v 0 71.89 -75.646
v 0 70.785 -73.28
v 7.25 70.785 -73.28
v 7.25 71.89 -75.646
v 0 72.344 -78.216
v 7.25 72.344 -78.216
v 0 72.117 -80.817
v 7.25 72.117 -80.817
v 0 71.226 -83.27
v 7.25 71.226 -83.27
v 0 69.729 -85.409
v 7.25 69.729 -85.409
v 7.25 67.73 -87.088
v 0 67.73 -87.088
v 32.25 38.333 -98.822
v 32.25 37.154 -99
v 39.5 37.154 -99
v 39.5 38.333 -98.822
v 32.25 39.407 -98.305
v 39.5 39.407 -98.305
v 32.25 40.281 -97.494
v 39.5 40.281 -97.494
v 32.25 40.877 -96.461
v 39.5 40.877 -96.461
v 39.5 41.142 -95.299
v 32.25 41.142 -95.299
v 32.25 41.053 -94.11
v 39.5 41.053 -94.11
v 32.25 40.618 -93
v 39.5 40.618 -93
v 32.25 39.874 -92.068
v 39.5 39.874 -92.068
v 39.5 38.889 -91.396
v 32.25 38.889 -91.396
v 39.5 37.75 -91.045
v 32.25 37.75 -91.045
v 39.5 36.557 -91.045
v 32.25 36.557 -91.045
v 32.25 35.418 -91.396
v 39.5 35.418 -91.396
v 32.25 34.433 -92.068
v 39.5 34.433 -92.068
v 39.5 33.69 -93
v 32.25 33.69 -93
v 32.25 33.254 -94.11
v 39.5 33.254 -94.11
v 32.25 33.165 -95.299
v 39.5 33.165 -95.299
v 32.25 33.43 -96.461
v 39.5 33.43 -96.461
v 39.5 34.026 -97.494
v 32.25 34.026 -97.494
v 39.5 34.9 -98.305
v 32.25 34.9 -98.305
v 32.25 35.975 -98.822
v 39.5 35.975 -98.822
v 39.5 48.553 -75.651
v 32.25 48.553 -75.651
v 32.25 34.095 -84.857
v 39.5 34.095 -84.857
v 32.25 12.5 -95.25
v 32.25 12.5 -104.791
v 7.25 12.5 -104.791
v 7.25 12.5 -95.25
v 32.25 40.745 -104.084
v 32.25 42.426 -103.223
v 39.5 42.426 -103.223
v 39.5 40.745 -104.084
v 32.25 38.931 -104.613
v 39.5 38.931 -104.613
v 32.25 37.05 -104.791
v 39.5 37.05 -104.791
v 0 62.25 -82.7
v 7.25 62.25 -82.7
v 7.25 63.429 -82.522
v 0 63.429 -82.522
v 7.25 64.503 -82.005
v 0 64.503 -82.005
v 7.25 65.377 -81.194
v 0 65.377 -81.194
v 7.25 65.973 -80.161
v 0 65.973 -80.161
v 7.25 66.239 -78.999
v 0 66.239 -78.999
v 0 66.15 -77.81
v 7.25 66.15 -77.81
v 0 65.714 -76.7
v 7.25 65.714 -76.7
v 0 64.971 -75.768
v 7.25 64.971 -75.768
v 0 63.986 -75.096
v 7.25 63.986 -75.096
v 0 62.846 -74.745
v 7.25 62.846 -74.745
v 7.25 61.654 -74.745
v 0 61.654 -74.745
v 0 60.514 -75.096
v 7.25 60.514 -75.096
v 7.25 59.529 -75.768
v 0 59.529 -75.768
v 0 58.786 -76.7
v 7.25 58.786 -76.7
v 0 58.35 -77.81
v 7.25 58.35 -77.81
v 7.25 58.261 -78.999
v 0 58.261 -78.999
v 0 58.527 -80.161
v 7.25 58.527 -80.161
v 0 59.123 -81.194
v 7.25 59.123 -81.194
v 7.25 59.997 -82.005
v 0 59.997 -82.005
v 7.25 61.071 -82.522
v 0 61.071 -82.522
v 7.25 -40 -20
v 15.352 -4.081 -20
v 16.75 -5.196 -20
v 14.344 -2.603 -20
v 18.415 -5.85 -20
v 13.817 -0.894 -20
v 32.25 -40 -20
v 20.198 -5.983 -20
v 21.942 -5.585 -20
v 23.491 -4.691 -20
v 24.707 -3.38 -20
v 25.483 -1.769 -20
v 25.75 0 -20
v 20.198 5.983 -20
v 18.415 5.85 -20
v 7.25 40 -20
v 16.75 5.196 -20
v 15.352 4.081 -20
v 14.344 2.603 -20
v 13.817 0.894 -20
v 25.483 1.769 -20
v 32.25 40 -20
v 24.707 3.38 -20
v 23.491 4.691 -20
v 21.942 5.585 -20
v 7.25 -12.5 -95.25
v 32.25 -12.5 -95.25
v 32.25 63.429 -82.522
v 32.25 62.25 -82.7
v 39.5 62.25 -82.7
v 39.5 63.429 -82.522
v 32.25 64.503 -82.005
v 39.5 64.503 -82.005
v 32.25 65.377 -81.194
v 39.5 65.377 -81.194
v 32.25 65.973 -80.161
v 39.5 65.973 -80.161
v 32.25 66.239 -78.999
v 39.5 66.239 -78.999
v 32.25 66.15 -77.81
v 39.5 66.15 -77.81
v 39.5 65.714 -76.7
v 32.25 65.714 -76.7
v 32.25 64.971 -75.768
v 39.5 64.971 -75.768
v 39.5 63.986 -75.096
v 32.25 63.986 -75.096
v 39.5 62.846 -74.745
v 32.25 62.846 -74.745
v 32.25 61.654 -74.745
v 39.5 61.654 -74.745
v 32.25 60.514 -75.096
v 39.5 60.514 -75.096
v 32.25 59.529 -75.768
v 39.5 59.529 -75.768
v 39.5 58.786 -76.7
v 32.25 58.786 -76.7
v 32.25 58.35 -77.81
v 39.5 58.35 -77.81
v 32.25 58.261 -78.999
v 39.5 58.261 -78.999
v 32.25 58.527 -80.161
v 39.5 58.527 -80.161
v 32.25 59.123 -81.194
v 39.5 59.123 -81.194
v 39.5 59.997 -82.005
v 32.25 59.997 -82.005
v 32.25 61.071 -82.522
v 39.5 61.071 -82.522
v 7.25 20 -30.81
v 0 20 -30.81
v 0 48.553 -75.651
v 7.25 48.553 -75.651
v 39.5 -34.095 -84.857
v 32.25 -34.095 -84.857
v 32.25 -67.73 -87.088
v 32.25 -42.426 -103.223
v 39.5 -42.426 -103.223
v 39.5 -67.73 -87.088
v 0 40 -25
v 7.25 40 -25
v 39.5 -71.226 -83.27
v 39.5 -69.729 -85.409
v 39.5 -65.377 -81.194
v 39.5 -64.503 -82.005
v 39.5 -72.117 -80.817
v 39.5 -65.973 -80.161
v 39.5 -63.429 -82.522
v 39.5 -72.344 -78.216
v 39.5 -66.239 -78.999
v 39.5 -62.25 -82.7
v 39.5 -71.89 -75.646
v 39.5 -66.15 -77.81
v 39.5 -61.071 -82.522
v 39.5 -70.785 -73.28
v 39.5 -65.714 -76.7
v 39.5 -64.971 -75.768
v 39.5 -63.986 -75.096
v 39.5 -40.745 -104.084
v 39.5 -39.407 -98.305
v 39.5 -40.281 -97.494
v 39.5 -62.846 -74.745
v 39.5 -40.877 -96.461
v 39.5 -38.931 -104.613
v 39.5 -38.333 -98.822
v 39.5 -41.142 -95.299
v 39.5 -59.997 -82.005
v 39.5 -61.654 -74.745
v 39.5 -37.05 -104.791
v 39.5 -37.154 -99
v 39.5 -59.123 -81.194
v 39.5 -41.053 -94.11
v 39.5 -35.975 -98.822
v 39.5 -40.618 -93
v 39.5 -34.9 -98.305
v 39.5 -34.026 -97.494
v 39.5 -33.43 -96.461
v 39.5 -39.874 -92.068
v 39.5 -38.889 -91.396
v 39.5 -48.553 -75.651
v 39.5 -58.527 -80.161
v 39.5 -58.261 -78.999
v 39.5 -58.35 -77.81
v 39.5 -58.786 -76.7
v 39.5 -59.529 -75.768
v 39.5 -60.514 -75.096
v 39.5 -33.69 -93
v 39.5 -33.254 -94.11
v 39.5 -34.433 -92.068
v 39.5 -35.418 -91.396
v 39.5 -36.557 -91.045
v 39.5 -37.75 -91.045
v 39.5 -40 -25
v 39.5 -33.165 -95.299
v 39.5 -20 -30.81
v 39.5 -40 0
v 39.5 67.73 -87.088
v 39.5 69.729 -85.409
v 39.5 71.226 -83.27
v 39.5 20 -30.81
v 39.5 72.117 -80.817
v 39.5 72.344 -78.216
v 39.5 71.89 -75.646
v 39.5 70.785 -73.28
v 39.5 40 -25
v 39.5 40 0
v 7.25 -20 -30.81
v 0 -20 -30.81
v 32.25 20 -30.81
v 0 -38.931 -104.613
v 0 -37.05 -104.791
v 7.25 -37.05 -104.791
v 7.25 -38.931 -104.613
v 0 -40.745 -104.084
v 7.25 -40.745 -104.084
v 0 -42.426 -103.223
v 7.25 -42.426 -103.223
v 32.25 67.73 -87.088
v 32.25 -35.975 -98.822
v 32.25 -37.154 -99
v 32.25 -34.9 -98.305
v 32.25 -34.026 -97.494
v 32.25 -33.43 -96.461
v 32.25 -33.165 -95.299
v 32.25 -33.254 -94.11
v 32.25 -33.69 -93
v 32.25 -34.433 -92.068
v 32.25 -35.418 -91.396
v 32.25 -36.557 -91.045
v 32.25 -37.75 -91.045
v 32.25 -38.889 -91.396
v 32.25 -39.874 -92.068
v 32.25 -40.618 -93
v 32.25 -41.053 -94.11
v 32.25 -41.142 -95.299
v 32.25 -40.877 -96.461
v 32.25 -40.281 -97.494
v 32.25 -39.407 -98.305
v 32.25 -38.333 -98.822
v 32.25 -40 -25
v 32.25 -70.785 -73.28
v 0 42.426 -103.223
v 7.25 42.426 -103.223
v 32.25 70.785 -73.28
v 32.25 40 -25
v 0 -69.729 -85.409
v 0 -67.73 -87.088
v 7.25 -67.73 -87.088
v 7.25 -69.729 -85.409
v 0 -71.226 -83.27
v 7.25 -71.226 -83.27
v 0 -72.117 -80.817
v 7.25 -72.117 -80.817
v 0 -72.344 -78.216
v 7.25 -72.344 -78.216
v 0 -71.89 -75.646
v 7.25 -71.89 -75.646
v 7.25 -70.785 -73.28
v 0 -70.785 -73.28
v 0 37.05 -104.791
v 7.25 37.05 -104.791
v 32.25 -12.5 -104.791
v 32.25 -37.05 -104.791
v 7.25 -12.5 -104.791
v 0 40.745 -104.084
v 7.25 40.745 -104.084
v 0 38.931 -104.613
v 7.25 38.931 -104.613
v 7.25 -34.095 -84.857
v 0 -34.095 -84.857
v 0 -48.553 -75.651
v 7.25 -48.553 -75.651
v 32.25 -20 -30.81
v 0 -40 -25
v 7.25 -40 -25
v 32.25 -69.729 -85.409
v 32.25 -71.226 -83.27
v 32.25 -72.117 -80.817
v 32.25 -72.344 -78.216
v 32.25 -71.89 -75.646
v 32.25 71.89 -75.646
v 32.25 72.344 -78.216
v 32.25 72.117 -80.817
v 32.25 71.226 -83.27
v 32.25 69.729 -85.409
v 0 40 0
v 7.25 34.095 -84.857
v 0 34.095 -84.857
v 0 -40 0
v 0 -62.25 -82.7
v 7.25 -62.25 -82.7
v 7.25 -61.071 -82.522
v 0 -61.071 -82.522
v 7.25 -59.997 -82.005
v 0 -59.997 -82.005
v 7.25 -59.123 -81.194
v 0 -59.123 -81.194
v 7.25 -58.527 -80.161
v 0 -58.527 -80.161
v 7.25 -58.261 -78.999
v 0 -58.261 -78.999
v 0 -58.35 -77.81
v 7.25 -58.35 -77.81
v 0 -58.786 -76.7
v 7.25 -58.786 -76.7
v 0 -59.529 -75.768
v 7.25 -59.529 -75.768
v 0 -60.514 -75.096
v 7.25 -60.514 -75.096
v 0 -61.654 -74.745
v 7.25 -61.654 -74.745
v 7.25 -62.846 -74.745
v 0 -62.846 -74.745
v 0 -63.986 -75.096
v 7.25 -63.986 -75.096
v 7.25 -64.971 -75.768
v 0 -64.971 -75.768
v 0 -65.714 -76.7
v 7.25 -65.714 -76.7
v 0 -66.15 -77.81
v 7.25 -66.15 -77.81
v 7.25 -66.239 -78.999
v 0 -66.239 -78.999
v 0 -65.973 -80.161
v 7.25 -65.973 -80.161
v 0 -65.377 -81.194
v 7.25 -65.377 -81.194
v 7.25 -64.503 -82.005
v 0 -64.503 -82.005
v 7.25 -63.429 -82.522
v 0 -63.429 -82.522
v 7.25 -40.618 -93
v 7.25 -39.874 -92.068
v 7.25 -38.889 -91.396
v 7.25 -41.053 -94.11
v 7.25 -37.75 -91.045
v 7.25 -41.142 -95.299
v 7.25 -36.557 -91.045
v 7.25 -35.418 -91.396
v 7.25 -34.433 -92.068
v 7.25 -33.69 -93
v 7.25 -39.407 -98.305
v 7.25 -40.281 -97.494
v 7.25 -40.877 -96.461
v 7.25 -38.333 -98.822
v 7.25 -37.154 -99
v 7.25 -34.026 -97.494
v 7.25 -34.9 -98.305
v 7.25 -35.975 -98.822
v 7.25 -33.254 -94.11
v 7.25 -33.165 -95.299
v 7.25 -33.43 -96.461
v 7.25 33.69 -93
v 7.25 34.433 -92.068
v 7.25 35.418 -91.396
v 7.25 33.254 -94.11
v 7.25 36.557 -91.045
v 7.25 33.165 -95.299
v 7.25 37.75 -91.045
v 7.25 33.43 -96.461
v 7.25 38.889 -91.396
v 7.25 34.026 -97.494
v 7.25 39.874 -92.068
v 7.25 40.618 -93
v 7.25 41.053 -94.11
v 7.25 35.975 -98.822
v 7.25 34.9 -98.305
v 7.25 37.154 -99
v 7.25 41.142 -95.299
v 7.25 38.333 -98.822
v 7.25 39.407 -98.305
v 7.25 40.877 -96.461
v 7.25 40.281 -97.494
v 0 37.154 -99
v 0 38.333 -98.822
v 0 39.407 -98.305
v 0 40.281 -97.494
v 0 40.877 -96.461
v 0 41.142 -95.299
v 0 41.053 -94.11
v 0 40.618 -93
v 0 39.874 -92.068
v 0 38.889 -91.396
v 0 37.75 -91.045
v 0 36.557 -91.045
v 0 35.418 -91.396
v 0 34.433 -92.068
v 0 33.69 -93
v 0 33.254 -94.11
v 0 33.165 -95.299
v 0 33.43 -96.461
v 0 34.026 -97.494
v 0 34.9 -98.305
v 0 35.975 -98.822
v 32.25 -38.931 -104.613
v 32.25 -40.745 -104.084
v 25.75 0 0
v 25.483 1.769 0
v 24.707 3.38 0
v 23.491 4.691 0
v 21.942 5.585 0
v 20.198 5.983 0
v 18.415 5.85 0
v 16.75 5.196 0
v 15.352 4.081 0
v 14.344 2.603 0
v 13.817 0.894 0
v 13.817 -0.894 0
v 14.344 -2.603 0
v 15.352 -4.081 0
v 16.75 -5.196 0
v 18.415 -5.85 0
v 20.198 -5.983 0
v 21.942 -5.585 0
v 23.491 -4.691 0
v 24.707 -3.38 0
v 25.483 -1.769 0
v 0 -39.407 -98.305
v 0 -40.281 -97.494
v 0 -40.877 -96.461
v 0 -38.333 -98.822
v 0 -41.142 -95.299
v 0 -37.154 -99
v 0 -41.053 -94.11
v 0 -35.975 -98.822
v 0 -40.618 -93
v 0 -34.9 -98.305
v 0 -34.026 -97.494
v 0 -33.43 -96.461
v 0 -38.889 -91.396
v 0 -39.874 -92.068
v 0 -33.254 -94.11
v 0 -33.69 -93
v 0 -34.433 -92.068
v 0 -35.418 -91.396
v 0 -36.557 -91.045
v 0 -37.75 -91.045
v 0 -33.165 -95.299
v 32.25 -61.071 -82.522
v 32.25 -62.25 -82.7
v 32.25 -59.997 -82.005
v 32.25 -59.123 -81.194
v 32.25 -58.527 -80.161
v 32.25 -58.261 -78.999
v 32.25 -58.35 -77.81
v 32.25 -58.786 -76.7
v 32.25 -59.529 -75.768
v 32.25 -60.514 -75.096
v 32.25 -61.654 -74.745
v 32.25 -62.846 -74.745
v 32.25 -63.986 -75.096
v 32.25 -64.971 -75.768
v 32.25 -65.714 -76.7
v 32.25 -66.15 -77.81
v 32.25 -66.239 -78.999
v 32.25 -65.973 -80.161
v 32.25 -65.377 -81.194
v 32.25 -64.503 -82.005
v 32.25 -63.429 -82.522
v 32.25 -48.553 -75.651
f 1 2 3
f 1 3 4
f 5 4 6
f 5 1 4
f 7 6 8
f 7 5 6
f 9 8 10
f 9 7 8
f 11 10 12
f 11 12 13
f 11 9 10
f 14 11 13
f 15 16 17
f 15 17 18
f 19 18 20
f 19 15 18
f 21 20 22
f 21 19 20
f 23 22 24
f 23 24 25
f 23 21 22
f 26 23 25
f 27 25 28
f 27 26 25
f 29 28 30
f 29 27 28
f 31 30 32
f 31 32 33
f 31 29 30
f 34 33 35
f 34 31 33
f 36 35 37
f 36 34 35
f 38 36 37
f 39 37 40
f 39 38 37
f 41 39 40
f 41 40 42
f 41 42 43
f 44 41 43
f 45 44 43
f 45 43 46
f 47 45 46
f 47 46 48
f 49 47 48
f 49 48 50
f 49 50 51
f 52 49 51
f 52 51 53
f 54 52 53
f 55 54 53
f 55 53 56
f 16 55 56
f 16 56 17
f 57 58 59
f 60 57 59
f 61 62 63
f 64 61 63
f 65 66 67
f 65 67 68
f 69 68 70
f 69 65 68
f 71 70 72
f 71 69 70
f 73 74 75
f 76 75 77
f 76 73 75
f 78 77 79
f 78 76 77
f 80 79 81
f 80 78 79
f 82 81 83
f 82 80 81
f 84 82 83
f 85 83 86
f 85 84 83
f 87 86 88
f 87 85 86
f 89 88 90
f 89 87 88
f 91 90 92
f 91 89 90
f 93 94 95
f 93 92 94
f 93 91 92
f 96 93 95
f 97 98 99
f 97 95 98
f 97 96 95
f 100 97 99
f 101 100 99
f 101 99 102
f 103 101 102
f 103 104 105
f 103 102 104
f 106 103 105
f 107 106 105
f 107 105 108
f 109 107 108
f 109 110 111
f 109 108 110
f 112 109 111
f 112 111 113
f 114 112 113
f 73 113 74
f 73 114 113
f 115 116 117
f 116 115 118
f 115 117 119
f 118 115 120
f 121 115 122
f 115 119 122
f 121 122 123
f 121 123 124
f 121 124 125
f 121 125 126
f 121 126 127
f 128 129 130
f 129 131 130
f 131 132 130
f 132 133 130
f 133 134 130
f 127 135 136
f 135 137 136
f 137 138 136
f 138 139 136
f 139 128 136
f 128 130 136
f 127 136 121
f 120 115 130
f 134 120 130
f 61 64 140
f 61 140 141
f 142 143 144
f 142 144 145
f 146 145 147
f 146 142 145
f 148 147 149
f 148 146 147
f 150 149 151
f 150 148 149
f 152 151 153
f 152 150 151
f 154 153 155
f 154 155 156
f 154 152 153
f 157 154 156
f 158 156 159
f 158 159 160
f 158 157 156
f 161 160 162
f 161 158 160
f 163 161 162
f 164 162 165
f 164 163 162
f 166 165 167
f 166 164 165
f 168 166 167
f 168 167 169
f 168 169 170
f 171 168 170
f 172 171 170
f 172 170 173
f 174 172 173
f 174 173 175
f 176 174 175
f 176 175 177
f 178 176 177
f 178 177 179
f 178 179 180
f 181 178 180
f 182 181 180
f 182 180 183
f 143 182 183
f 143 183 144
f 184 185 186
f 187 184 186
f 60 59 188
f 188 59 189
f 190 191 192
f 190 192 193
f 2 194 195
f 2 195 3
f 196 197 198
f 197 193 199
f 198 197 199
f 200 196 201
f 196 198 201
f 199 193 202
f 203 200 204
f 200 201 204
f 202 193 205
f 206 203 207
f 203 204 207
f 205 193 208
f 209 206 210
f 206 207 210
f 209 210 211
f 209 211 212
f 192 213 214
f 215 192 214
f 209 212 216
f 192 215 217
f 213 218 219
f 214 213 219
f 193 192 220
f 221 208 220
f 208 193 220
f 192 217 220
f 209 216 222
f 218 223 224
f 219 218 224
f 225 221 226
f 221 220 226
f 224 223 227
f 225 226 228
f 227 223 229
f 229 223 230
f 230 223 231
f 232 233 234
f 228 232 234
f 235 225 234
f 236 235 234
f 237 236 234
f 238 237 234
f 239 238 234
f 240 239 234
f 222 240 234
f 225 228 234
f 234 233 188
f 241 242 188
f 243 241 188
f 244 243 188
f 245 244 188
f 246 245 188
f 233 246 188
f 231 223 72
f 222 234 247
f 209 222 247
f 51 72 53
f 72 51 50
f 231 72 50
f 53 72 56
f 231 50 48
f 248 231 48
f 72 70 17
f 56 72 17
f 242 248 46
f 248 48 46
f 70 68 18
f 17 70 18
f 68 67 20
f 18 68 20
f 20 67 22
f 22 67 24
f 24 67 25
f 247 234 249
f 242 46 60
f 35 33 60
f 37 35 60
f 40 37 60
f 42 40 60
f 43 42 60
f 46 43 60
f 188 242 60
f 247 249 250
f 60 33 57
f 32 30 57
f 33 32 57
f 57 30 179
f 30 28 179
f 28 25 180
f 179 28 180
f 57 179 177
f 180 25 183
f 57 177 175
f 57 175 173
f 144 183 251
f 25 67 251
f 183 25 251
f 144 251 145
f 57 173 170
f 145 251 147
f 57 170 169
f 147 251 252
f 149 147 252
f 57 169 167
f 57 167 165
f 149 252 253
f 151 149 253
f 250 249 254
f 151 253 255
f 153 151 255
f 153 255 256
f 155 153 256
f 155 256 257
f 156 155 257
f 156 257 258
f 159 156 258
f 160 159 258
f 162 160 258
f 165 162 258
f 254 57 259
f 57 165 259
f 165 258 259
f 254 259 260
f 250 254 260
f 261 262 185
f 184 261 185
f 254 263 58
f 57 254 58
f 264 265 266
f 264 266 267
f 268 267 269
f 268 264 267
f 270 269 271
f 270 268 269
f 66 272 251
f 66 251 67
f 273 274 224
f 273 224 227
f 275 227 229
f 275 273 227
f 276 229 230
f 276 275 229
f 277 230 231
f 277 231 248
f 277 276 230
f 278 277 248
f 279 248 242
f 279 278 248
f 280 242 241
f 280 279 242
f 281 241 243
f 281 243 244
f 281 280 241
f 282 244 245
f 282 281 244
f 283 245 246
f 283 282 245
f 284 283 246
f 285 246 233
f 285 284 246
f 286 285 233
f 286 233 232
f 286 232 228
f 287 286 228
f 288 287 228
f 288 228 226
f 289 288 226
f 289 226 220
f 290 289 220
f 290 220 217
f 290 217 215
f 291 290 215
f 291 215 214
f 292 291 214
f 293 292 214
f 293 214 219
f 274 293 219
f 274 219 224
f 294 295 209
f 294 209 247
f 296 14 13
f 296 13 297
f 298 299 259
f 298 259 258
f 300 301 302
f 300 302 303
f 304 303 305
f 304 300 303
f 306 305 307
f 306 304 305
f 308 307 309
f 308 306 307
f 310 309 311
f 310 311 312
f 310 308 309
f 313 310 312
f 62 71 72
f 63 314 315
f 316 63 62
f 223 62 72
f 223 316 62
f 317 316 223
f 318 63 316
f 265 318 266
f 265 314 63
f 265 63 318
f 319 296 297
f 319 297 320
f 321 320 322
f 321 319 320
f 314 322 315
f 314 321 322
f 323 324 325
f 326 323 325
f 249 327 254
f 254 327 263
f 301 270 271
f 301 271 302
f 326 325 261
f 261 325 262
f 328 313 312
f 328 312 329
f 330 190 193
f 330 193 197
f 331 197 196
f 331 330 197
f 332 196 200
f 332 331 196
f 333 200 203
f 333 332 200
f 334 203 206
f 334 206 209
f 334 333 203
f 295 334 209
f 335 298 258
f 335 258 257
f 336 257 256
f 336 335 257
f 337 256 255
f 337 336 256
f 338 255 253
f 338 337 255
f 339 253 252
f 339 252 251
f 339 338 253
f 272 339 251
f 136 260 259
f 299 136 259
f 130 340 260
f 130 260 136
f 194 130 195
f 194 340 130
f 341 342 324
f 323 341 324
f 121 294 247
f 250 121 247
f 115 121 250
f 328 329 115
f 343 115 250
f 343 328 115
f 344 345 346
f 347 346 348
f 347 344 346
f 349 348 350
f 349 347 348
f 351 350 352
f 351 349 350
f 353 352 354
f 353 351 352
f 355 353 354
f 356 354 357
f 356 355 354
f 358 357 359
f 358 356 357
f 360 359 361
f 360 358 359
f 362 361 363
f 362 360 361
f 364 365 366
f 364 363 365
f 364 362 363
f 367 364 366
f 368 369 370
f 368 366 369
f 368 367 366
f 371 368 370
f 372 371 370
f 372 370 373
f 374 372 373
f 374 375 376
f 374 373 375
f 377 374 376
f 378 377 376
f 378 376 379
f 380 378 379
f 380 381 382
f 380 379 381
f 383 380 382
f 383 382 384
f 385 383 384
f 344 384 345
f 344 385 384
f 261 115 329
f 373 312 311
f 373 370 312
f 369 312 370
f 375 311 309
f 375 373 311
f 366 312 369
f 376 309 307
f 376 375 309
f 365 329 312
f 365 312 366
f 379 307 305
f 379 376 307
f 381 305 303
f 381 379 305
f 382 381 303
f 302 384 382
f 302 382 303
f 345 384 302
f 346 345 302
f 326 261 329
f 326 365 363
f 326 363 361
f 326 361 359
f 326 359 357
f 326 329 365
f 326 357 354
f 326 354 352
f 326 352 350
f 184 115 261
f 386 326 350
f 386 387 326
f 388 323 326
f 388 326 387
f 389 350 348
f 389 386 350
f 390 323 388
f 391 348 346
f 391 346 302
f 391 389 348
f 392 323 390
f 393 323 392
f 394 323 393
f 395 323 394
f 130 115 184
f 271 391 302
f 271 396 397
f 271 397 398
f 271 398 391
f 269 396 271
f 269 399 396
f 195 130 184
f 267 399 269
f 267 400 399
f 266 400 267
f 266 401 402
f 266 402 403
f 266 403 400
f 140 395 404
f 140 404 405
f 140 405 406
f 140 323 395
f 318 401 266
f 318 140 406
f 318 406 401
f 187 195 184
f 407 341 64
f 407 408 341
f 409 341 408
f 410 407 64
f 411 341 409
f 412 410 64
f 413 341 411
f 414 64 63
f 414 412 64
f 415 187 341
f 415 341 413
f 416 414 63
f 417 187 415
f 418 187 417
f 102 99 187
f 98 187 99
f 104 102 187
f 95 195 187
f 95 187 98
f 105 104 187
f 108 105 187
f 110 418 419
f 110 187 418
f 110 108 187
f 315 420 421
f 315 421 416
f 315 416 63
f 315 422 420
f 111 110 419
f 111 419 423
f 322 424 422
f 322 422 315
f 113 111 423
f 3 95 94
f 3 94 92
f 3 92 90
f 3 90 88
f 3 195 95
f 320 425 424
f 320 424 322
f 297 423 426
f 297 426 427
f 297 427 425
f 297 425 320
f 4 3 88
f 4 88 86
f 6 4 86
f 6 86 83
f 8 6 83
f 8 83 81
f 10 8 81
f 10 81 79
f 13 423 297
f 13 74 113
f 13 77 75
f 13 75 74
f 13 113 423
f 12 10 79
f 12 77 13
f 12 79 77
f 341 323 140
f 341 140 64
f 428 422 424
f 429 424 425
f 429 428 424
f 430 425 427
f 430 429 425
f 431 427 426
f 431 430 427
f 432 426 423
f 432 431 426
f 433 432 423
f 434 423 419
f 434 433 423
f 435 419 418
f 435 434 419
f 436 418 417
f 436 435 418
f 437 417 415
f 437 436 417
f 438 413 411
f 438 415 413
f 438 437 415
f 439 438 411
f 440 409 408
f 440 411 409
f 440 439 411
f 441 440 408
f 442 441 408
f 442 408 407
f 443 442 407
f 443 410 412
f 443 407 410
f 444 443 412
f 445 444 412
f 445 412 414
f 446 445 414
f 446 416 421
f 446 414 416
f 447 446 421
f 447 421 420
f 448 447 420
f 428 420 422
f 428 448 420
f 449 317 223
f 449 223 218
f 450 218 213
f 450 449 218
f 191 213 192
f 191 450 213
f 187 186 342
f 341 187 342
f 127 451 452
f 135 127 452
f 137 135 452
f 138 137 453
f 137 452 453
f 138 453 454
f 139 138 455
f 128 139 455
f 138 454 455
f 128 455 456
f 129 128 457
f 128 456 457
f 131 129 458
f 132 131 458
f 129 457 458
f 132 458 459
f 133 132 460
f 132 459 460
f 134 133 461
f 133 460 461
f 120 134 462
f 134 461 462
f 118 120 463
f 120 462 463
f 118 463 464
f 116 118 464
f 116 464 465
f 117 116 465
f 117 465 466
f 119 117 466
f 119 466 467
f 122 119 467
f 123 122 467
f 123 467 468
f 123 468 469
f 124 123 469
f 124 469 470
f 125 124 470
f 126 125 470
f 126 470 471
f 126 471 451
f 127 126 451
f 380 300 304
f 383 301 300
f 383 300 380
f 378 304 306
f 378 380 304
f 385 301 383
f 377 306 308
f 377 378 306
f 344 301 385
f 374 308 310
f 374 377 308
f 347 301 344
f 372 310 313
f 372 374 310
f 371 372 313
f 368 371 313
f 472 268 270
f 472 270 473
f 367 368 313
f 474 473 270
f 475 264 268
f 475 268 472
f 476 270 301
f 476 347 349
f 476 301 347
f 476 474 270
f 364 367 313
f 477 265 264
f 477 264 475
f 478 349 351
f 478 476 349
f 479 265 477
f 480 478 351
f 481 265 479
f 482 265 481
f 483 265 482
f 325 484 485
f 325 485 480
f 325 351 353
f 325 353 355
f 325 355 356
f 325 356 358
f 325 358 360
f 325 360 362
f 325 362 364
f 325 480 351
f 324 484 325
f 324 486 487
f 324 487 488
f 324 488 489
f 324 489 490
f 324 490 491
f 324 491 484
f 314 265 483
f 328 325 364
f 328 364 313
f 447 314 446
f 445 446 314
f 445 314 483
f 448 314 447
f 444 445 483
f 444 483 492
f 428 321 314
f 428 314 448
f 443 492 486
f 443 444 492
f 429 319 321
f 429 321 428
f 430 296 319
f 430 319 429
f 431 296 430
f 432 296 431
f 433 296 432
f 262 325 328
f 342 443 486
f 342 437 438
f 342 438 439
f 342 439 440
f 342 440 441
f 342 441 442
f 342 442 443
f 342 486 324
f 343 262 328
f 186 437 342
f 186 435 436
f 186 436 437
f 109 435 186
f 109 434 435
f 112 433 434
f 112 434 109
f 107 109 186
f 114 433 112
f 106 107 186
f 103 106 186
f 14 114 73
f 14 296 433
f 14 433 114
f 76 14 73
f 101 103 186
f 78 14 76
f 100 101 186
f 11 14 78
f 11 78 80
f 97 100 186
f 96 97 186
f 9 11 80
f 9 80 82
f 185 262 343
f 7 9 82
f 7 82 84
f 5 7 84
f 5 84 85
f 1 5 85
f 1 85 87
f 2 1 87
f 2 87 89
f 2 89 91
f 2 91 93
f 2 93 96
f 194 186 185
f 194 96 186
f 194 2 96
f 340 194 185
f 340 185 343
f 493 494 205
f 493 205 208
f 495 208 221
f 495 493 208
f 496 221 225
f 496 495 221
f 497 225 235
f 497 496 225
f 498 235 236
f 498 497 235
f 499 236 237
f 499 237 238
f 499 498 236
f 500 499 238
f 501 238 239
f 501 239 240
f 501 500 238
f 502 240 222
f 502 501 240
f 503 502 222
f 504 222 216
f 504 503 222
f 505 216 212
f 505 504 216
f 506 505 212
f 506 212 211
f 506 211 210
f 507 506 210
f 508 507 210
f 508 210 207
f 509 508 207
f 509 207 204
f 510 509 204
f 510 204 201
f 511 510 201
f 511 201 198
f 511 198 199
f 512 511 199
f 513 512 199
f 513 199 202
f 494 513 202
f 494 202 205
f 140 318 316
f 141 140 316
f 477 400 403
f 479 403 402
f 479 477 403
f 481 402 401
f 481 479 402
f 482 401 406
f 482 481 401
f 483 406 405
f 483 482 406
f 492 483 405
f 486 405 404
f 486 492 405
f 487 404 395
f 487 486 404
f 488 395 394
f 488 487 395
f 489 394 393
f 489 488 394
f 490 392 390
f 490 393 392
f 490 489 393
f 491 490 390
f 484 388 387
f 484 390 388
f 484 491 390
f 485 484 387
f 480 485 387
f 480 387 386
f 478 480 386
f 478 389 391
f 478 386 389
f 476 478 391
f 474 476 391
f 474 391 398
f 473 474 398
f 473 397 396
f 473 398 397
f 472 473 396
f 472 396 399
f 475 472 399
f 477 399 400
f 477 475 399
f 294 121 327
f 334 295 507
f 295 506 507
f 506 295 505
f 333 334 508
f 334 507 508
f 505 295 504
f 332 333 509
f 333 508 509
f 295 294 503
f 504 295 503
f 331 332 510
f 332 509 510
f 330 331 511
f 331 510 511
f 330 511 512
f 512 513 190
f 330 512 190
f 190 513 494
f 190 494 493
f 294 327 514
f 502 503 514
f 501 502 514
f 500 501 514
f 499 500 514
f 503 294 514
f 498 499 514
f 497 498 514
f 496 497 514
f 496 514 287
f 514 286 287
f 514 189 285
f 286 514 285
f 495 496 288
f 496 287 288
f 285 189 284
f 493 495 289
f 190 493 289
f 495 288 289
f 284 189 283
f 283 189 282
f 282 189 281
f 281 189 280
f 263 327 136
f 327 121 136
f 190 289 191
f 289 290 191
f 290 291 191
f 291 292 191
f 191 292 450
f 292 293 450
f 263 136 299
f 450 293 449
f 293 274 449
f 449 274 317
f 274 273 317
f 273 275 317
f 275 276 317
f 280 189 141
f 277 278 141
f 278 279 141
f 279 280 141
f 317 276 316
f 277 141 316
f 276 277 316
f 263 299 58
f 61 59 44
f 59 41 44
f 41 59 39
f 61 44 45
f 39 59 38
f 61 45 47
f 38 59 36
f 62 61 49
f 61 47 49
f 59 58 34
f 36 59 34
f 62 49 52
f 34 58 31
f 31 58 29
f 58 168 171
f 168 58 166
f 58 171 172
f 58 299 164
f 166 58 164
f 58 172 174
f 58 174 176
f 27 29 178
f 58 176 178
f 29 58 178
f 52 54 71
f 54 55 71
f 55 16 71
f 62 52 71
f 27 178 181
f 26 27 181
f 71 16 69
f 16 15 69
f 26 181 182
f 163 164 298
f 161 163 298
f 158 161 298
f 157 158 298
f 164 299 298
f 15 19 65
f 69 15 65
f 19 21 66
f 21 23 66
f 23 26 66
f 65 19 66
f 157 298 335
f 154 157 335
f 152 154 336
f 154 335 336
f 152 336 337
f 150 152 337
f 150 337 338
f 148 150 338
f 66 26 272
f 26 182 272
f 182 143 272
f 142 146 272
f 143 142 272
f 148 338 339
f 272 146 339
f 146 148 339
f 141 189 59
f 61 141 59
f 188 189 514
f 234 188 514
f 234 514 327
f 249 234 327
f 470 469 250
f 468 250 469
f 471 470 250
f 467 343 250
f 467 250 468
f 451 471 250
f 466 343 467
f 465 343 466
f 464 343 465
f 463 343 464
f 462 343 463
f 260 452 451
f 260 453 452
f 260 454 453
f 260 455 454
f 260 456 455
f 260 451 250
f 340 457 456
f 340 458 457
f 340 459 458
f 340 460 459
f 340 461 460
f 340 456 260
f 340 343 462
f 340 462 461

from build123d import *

# Parameters (mm, degrees)
SKETCH1_R               = 4
BOSS_EXTRUDE1_DEPTH     = 39.5
SKETCH2_W               = 25
SKETCH2_H               = 75.25
CUT_EXTRUDE1_DEPTH      = 105.5
CUT_EXTRUDE1_DEPTH_BACK = 117.5
CUT_EXTRUDE2_DEPTH      = 43.5
SKETCH4_R               = 6
CUT_EXTRUDE3_DEPTH      = 41


with BuildPart() as part:
    # Sketch1 → Boss-Extrude1 (new body)
    with BuildSketch(Plane(origin=(0, 0, 0), x_dir=(0, 0, -1), z_dir=(1, 0, 0))):
        with BuildLine():
            Line((0, -40), (0, 40))
            Line((0, 40), (25, 40))
            Line((25, 40), (73.280107592, 70.785366831))
            ThreePointArc((73.280107592, 70.785366831), (80.81695996, 72.117470486), (87.088258906, 67.730050596))
            Line((87.088258906, 67.730050596), (103.222887942, 42.426417539))
            ThreePointArc((103.222887942, 42.426417539), (104.391084837, 39.850237691), (104.791154167, 37.05))
            Line((104.791154167, 37.05), (104.791154167, -37.05))
            ThreePointArc((104.791154167, -37.05), (104.391084837, -39.850237691), (103.222887942, -42.426417539))
            Line((103.222887942, -42.426417539), (87.088258906, -67.730050596))
            ThreePointArc((87.088258906, -67.730050596), (80.81695996, -72.117470486), (73.280107592, -70.785366831))
            Line((73.280107592, -70.785366831), (25, -40))
            Line((25, -40), (0, -40))
        make_face()
        with Locations((78.7, 62.25)):
            Circle(SKETCH1_R, mode=Mode.SUBTRACT)
        with Locations((95, 37.153633057)):
            Circle(SKETCH1_R, mode=Mode.SUBTRACT)
        with Locations((95, -37.153633057)):
            Circle(SKETCH1_R, mode=Mode.SUBTRACT)
        with Locations((78.7, -62.25)):
            Circle(SKETCH1_R, mode=Mode.SUBTRACT)
        Polygon((30.81, -20), (30.81, 20), (75.651092334, 48.552793879), (84.857166207, 34.095), (84.857166207, -34.095), (75.651092334, -48.552793879), align=None, mode=Mode.SUBTRACT)
    extrude(amount=BOSS_EXTRUDE1_DEPTH)

    # Sketch2 → Cut-Extrude1 (cut, two sides)
    with BuildSketch(Plane(origin=(0, 0, 0), x_dir=(1, 0, 0), z_dir=(0, 1, 0))) as cut_extrude1_sk:
        with Locations((19.75, 57.625)):
            Rectangle(SKETCH2_W, SKETCH2_H)
    extrude(amount=CUT_EXTRUDE1_DEPTH, mode=Mode.SUBTRACT)
    extrude(cut_extrude1_sk.sketch, amount=-CUT_EXTRUDE1_DEPTH_BACK, mode=Mode.SUBTRACT)

    # Sketch3 → Cut-Extrude2 (cut)
    with BuildSketch(Plane(origin=(0, 0, -104.791154167), x_dir=(-1, 0, 0), z_dir=(0, 0, -1))):
        Polygon((-7.25, -37.05), (-7.25, -12.5), (-32.25, -12.5), (-32.25, -37.05), (-32.25, -54.930146657), (-7.25, -54.930146657), align=None)
        Polygon((-32.25, 37.05), (-32.25, 12.5), (-7.25, 12.5), (-7.25, 37.05), (-7.25, 54.930146657), (-32.25, 54.930146657), align=None)
    extrude(amount=-CUT_EXTRUDE2_DEPTH, mode=Mode.SUBTRACT)

    # Sketch4 → Cut-Extrude3 (cut)
    with BuildSketch(Plane.XY):
        with Locations((19.75, 0)):
            Circle(SKETCH4_R)
    extrude(amount=-CUT_EXTRUDE3_DEPTH, mode=Mode.SUBTRACT)


solid = part.part
